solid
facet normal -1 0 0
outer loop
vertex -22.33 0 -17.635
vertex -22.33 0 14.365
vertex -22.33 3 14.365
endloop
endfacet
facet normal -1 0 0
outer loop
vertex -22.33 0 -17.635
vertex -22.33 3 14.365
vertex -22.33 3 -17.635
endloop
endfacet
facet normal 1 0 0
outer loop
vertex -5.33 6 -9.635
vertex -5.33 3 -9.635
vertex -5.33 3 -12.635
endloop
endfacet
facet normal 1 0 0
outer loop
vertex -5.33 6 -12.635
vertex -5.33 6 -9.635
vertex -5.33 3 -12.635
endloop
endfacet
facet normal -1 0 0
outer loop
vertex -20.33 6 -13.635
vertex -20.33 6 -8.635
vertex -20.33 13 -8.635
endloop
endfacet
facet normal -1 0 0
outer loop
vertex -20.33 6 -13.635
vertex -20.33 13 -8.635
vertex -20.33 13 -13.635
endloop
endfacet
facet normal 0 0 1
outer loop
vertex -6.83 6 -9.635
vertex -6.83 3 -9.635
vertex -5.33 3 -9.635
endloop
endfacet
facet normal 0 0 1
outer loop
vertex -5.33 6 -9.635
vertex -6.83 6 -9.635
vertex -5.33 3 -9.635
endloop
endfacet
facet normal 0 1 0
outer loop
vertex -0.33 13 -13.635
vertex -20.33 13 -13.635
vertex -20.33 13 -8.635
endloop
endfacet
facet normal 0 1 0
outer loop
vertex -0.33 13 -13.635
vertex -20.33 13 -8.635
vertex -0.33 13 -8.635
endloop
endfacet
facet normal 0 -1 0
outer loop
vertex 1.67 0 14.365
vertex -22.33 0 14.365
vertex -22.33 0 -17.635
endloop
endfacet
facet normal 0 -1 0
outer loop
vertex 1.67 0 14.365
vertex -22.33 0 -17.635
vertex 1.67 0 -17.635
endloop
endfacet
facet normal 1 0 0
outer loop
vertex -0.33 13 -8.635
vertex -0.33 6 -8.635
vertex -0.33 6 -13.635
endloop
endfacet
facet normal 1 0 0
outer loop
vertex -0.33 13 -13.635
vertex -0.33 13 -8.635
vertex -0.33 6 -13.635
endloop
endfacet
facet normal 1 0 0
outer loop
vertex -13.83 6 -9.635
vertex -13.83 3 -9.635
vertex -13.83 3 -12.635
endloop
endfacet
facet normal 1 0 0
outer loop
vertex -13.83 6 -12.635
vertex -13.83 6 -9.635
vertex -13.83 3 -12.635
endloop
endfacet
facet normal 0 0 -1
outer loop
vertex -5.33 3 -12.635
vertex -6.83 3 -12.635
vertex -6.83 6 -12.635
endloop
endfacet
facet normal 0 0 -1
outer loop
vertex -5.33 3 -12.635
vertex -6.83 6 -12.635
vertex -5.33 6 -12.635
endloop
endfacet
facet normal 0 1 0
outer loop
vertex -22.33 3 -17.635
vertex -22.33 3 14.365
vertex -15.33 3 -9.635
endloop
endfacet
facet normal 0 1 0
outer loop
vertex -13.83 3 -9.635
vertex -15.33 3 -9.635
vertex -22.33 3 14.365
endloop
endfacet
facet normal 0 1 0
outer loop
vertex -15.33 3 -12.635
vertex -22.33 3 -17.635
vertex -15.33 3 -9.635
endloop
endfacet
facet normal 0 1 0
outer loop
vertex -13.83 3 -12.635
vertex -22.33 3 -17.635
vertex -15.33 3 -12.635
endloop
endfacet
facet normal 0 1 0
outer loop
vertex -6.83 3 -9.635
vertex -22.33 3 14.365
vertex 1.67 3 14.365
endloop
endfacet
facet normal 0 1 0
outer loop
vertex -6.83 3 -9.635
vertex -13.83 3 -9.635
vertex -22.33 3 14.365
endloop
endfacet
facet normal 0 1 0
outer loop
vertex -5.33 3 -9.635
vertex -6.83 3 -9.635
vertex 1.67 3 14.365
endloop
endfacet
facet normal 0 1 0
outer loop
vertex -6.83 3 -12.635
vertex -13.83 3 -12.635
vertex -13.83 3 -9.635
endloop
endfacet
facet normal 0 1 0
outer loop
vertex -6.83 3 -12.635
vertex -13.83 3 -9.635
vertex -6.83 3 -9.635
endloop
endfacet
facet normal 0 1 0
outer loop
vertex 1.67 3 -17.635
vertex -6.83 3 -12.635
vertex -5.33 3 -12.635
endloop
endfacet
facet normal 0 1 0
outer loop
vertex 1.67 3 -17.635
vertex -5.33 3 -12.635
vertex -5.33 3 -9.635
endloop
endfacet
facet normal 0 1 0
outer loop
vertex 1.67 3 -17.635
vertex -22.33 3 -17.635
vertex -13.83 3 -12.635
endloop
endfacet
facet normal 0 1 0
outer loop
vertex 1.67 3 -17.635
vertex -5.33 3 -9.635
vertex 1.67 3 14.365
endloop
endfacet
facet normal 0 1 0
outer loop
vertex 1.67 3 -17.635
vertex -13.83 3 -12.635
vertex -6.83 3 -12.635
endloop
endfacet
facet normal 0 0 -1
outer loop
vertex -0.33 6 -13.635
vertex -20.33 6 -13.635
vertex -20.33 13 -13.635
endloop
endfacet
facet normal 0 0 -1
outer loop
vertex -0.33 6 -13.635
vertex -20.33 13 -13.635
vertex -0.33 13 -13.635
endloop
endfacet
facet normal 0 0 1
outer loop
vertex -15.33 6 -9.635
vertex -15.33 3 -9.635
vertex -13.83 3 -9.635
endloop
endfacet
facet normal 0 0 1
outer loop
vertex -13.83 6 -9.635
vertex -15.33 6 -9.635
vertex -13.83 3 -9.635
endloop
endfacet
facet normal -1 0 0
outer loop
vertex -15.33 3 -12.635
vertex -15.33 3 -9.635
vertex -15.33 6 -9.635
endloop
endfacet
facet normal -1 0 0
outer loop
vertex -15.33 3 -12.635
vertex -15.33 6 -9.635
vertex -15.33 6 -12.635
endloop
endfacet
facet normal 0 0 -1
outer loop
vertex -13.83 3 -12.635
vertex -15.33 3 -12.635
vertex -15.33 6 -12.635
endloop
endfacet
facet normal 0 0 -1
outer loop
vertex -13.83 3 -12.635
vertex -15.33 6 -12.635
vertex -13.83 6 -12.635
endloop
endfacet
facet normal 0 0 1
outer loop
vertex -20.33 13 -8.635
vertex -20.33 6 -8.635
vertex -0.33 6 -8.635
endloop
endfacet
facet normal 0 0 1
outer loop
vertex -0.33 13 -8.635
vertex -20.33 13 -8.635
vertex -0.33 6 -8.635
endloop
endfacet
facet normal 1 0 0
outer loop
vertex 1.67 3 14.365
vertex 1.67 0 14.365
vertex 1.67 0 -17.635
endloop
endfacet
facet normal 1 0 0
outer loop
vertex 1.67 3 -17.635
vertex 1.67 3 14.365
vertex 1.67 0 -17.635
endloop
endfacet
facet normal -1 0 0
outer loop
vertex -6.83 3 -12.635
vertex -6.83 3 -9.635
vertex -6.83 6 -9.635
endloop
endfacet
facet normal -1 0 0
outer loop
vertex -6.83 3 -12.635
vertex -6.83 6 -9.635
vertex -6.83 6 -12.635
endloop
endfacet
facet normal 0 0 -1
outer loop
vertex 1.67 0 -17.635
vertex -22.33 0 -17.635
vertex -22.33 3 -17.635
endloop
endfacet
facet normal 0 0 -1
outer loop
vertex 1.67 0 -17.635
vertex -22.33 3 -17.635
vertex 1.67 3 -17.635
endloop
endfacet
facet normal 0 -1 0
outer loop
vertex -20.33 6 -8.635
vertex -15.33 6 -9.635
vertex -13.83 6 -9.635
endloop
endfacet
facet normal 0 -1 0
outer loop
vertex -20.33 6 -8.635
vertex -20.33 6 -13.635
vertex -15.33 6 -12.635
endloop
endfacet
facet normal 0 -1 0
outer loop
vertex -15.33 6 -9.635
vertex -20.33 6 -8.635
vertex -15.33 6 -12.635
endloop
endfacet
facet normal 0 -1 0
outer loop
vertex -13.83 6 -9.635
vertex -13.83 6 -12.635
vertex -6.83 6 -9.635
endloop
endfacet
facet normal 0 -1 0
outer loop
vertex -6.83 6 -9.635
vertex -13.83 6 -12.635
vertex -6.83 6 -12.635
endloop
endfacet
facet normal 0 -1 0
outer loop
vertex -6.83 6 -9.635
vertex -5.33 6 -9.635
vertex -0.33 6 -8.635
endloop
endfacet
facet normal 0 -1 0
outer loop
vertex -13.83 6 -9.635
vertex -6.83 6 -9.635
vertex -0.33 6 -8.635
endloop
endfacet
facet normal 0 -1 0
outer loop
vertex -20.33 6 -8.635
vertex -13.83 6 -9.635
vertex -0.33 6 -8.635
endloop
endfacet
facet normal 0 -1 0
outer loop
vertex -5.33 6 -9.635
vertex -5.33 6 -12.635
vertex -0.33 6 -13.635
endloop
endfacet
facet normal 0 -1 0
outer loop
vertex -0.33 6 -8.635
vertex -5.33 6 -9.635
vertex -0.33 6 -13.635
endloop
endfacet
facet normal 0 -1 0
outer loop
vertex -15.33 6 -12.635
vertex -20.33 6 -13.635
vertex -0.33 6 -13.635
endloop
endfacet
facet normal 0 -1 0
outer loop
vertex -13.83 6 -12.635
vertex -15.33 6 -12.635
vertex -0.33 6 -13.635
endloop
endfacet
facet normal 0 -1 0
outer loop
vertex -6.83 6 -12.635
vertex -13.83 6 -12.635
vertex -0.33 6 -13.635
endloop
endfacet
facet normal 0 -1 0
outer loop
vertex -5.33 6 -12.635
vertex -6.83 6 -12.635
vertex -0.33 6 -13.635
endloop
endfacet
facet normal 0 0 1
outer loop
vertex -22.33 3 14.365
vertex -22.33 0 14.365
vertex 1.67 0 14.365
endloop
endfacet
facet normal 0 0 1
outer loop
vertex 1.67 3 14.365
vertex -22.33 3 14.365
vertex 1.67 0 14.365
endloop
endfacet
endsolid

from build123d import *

# Parameters (mm, degrees)
SKETCH1_W           = 24
SKETCH1_H           = 32
BOSS_EXTRUDE1_DEPTH = 3
SKETCH2_W           = 1.5
SKETCH2_H           = 3
BOSS_EXTRUDE3_DEPTH = 3
SKETCH3_W           = 20
SKETCH3_H           = 5
BOSS_EXTRUDE4_DEPTH = 7


with BuildPart() as part:
    # Sketch1 → Boss-Extrude1 (new body)
    with BuildSketch(Plane(origin=(0, 0, 0), x_dir=(1, 0, 0), z_dir=(0, 1, 0))):
        with Locations((-10.330434783, 1.634782609)):
            Rectangle(SKETCH1_W, SKETCH1_H)
    extrude(amount=BOSS_EXTRUDE1_DEPTH)

    # Sketch2 → Boss-Extrude3 (add)
    with BuildSketch(Plane(origin=(0, 3, 0), x_dir=(1, 0, 0), z_dir=(0, 1, 0))):
        with Locations((-14.580434783, 11.134782609)):
            Rectangle(SKETCH2_W, SKETCH2_H)
        with Locations((-6.080434783, 11.134782609)):
            Rectangle(SKETCH2_W, SKETCH2_H)
    extrude(amount=BOSS_EXTRUDE3_DEPTH)

    # Sketch3 → Boss-Extrude4 (add)
    with BuildSketch(Plane(origin=(0, 6, 0), x_dir=(1, 0, 0), z_dir=(0, 1, 0))):
        with Locations((-10.330434783, 11.134782609)):
            Rectangle(SKETCH3_W, SKETCH3_H)
    extrude(amount=BOSS_EXTRUDE4_DEPTH)


solid = part.part
